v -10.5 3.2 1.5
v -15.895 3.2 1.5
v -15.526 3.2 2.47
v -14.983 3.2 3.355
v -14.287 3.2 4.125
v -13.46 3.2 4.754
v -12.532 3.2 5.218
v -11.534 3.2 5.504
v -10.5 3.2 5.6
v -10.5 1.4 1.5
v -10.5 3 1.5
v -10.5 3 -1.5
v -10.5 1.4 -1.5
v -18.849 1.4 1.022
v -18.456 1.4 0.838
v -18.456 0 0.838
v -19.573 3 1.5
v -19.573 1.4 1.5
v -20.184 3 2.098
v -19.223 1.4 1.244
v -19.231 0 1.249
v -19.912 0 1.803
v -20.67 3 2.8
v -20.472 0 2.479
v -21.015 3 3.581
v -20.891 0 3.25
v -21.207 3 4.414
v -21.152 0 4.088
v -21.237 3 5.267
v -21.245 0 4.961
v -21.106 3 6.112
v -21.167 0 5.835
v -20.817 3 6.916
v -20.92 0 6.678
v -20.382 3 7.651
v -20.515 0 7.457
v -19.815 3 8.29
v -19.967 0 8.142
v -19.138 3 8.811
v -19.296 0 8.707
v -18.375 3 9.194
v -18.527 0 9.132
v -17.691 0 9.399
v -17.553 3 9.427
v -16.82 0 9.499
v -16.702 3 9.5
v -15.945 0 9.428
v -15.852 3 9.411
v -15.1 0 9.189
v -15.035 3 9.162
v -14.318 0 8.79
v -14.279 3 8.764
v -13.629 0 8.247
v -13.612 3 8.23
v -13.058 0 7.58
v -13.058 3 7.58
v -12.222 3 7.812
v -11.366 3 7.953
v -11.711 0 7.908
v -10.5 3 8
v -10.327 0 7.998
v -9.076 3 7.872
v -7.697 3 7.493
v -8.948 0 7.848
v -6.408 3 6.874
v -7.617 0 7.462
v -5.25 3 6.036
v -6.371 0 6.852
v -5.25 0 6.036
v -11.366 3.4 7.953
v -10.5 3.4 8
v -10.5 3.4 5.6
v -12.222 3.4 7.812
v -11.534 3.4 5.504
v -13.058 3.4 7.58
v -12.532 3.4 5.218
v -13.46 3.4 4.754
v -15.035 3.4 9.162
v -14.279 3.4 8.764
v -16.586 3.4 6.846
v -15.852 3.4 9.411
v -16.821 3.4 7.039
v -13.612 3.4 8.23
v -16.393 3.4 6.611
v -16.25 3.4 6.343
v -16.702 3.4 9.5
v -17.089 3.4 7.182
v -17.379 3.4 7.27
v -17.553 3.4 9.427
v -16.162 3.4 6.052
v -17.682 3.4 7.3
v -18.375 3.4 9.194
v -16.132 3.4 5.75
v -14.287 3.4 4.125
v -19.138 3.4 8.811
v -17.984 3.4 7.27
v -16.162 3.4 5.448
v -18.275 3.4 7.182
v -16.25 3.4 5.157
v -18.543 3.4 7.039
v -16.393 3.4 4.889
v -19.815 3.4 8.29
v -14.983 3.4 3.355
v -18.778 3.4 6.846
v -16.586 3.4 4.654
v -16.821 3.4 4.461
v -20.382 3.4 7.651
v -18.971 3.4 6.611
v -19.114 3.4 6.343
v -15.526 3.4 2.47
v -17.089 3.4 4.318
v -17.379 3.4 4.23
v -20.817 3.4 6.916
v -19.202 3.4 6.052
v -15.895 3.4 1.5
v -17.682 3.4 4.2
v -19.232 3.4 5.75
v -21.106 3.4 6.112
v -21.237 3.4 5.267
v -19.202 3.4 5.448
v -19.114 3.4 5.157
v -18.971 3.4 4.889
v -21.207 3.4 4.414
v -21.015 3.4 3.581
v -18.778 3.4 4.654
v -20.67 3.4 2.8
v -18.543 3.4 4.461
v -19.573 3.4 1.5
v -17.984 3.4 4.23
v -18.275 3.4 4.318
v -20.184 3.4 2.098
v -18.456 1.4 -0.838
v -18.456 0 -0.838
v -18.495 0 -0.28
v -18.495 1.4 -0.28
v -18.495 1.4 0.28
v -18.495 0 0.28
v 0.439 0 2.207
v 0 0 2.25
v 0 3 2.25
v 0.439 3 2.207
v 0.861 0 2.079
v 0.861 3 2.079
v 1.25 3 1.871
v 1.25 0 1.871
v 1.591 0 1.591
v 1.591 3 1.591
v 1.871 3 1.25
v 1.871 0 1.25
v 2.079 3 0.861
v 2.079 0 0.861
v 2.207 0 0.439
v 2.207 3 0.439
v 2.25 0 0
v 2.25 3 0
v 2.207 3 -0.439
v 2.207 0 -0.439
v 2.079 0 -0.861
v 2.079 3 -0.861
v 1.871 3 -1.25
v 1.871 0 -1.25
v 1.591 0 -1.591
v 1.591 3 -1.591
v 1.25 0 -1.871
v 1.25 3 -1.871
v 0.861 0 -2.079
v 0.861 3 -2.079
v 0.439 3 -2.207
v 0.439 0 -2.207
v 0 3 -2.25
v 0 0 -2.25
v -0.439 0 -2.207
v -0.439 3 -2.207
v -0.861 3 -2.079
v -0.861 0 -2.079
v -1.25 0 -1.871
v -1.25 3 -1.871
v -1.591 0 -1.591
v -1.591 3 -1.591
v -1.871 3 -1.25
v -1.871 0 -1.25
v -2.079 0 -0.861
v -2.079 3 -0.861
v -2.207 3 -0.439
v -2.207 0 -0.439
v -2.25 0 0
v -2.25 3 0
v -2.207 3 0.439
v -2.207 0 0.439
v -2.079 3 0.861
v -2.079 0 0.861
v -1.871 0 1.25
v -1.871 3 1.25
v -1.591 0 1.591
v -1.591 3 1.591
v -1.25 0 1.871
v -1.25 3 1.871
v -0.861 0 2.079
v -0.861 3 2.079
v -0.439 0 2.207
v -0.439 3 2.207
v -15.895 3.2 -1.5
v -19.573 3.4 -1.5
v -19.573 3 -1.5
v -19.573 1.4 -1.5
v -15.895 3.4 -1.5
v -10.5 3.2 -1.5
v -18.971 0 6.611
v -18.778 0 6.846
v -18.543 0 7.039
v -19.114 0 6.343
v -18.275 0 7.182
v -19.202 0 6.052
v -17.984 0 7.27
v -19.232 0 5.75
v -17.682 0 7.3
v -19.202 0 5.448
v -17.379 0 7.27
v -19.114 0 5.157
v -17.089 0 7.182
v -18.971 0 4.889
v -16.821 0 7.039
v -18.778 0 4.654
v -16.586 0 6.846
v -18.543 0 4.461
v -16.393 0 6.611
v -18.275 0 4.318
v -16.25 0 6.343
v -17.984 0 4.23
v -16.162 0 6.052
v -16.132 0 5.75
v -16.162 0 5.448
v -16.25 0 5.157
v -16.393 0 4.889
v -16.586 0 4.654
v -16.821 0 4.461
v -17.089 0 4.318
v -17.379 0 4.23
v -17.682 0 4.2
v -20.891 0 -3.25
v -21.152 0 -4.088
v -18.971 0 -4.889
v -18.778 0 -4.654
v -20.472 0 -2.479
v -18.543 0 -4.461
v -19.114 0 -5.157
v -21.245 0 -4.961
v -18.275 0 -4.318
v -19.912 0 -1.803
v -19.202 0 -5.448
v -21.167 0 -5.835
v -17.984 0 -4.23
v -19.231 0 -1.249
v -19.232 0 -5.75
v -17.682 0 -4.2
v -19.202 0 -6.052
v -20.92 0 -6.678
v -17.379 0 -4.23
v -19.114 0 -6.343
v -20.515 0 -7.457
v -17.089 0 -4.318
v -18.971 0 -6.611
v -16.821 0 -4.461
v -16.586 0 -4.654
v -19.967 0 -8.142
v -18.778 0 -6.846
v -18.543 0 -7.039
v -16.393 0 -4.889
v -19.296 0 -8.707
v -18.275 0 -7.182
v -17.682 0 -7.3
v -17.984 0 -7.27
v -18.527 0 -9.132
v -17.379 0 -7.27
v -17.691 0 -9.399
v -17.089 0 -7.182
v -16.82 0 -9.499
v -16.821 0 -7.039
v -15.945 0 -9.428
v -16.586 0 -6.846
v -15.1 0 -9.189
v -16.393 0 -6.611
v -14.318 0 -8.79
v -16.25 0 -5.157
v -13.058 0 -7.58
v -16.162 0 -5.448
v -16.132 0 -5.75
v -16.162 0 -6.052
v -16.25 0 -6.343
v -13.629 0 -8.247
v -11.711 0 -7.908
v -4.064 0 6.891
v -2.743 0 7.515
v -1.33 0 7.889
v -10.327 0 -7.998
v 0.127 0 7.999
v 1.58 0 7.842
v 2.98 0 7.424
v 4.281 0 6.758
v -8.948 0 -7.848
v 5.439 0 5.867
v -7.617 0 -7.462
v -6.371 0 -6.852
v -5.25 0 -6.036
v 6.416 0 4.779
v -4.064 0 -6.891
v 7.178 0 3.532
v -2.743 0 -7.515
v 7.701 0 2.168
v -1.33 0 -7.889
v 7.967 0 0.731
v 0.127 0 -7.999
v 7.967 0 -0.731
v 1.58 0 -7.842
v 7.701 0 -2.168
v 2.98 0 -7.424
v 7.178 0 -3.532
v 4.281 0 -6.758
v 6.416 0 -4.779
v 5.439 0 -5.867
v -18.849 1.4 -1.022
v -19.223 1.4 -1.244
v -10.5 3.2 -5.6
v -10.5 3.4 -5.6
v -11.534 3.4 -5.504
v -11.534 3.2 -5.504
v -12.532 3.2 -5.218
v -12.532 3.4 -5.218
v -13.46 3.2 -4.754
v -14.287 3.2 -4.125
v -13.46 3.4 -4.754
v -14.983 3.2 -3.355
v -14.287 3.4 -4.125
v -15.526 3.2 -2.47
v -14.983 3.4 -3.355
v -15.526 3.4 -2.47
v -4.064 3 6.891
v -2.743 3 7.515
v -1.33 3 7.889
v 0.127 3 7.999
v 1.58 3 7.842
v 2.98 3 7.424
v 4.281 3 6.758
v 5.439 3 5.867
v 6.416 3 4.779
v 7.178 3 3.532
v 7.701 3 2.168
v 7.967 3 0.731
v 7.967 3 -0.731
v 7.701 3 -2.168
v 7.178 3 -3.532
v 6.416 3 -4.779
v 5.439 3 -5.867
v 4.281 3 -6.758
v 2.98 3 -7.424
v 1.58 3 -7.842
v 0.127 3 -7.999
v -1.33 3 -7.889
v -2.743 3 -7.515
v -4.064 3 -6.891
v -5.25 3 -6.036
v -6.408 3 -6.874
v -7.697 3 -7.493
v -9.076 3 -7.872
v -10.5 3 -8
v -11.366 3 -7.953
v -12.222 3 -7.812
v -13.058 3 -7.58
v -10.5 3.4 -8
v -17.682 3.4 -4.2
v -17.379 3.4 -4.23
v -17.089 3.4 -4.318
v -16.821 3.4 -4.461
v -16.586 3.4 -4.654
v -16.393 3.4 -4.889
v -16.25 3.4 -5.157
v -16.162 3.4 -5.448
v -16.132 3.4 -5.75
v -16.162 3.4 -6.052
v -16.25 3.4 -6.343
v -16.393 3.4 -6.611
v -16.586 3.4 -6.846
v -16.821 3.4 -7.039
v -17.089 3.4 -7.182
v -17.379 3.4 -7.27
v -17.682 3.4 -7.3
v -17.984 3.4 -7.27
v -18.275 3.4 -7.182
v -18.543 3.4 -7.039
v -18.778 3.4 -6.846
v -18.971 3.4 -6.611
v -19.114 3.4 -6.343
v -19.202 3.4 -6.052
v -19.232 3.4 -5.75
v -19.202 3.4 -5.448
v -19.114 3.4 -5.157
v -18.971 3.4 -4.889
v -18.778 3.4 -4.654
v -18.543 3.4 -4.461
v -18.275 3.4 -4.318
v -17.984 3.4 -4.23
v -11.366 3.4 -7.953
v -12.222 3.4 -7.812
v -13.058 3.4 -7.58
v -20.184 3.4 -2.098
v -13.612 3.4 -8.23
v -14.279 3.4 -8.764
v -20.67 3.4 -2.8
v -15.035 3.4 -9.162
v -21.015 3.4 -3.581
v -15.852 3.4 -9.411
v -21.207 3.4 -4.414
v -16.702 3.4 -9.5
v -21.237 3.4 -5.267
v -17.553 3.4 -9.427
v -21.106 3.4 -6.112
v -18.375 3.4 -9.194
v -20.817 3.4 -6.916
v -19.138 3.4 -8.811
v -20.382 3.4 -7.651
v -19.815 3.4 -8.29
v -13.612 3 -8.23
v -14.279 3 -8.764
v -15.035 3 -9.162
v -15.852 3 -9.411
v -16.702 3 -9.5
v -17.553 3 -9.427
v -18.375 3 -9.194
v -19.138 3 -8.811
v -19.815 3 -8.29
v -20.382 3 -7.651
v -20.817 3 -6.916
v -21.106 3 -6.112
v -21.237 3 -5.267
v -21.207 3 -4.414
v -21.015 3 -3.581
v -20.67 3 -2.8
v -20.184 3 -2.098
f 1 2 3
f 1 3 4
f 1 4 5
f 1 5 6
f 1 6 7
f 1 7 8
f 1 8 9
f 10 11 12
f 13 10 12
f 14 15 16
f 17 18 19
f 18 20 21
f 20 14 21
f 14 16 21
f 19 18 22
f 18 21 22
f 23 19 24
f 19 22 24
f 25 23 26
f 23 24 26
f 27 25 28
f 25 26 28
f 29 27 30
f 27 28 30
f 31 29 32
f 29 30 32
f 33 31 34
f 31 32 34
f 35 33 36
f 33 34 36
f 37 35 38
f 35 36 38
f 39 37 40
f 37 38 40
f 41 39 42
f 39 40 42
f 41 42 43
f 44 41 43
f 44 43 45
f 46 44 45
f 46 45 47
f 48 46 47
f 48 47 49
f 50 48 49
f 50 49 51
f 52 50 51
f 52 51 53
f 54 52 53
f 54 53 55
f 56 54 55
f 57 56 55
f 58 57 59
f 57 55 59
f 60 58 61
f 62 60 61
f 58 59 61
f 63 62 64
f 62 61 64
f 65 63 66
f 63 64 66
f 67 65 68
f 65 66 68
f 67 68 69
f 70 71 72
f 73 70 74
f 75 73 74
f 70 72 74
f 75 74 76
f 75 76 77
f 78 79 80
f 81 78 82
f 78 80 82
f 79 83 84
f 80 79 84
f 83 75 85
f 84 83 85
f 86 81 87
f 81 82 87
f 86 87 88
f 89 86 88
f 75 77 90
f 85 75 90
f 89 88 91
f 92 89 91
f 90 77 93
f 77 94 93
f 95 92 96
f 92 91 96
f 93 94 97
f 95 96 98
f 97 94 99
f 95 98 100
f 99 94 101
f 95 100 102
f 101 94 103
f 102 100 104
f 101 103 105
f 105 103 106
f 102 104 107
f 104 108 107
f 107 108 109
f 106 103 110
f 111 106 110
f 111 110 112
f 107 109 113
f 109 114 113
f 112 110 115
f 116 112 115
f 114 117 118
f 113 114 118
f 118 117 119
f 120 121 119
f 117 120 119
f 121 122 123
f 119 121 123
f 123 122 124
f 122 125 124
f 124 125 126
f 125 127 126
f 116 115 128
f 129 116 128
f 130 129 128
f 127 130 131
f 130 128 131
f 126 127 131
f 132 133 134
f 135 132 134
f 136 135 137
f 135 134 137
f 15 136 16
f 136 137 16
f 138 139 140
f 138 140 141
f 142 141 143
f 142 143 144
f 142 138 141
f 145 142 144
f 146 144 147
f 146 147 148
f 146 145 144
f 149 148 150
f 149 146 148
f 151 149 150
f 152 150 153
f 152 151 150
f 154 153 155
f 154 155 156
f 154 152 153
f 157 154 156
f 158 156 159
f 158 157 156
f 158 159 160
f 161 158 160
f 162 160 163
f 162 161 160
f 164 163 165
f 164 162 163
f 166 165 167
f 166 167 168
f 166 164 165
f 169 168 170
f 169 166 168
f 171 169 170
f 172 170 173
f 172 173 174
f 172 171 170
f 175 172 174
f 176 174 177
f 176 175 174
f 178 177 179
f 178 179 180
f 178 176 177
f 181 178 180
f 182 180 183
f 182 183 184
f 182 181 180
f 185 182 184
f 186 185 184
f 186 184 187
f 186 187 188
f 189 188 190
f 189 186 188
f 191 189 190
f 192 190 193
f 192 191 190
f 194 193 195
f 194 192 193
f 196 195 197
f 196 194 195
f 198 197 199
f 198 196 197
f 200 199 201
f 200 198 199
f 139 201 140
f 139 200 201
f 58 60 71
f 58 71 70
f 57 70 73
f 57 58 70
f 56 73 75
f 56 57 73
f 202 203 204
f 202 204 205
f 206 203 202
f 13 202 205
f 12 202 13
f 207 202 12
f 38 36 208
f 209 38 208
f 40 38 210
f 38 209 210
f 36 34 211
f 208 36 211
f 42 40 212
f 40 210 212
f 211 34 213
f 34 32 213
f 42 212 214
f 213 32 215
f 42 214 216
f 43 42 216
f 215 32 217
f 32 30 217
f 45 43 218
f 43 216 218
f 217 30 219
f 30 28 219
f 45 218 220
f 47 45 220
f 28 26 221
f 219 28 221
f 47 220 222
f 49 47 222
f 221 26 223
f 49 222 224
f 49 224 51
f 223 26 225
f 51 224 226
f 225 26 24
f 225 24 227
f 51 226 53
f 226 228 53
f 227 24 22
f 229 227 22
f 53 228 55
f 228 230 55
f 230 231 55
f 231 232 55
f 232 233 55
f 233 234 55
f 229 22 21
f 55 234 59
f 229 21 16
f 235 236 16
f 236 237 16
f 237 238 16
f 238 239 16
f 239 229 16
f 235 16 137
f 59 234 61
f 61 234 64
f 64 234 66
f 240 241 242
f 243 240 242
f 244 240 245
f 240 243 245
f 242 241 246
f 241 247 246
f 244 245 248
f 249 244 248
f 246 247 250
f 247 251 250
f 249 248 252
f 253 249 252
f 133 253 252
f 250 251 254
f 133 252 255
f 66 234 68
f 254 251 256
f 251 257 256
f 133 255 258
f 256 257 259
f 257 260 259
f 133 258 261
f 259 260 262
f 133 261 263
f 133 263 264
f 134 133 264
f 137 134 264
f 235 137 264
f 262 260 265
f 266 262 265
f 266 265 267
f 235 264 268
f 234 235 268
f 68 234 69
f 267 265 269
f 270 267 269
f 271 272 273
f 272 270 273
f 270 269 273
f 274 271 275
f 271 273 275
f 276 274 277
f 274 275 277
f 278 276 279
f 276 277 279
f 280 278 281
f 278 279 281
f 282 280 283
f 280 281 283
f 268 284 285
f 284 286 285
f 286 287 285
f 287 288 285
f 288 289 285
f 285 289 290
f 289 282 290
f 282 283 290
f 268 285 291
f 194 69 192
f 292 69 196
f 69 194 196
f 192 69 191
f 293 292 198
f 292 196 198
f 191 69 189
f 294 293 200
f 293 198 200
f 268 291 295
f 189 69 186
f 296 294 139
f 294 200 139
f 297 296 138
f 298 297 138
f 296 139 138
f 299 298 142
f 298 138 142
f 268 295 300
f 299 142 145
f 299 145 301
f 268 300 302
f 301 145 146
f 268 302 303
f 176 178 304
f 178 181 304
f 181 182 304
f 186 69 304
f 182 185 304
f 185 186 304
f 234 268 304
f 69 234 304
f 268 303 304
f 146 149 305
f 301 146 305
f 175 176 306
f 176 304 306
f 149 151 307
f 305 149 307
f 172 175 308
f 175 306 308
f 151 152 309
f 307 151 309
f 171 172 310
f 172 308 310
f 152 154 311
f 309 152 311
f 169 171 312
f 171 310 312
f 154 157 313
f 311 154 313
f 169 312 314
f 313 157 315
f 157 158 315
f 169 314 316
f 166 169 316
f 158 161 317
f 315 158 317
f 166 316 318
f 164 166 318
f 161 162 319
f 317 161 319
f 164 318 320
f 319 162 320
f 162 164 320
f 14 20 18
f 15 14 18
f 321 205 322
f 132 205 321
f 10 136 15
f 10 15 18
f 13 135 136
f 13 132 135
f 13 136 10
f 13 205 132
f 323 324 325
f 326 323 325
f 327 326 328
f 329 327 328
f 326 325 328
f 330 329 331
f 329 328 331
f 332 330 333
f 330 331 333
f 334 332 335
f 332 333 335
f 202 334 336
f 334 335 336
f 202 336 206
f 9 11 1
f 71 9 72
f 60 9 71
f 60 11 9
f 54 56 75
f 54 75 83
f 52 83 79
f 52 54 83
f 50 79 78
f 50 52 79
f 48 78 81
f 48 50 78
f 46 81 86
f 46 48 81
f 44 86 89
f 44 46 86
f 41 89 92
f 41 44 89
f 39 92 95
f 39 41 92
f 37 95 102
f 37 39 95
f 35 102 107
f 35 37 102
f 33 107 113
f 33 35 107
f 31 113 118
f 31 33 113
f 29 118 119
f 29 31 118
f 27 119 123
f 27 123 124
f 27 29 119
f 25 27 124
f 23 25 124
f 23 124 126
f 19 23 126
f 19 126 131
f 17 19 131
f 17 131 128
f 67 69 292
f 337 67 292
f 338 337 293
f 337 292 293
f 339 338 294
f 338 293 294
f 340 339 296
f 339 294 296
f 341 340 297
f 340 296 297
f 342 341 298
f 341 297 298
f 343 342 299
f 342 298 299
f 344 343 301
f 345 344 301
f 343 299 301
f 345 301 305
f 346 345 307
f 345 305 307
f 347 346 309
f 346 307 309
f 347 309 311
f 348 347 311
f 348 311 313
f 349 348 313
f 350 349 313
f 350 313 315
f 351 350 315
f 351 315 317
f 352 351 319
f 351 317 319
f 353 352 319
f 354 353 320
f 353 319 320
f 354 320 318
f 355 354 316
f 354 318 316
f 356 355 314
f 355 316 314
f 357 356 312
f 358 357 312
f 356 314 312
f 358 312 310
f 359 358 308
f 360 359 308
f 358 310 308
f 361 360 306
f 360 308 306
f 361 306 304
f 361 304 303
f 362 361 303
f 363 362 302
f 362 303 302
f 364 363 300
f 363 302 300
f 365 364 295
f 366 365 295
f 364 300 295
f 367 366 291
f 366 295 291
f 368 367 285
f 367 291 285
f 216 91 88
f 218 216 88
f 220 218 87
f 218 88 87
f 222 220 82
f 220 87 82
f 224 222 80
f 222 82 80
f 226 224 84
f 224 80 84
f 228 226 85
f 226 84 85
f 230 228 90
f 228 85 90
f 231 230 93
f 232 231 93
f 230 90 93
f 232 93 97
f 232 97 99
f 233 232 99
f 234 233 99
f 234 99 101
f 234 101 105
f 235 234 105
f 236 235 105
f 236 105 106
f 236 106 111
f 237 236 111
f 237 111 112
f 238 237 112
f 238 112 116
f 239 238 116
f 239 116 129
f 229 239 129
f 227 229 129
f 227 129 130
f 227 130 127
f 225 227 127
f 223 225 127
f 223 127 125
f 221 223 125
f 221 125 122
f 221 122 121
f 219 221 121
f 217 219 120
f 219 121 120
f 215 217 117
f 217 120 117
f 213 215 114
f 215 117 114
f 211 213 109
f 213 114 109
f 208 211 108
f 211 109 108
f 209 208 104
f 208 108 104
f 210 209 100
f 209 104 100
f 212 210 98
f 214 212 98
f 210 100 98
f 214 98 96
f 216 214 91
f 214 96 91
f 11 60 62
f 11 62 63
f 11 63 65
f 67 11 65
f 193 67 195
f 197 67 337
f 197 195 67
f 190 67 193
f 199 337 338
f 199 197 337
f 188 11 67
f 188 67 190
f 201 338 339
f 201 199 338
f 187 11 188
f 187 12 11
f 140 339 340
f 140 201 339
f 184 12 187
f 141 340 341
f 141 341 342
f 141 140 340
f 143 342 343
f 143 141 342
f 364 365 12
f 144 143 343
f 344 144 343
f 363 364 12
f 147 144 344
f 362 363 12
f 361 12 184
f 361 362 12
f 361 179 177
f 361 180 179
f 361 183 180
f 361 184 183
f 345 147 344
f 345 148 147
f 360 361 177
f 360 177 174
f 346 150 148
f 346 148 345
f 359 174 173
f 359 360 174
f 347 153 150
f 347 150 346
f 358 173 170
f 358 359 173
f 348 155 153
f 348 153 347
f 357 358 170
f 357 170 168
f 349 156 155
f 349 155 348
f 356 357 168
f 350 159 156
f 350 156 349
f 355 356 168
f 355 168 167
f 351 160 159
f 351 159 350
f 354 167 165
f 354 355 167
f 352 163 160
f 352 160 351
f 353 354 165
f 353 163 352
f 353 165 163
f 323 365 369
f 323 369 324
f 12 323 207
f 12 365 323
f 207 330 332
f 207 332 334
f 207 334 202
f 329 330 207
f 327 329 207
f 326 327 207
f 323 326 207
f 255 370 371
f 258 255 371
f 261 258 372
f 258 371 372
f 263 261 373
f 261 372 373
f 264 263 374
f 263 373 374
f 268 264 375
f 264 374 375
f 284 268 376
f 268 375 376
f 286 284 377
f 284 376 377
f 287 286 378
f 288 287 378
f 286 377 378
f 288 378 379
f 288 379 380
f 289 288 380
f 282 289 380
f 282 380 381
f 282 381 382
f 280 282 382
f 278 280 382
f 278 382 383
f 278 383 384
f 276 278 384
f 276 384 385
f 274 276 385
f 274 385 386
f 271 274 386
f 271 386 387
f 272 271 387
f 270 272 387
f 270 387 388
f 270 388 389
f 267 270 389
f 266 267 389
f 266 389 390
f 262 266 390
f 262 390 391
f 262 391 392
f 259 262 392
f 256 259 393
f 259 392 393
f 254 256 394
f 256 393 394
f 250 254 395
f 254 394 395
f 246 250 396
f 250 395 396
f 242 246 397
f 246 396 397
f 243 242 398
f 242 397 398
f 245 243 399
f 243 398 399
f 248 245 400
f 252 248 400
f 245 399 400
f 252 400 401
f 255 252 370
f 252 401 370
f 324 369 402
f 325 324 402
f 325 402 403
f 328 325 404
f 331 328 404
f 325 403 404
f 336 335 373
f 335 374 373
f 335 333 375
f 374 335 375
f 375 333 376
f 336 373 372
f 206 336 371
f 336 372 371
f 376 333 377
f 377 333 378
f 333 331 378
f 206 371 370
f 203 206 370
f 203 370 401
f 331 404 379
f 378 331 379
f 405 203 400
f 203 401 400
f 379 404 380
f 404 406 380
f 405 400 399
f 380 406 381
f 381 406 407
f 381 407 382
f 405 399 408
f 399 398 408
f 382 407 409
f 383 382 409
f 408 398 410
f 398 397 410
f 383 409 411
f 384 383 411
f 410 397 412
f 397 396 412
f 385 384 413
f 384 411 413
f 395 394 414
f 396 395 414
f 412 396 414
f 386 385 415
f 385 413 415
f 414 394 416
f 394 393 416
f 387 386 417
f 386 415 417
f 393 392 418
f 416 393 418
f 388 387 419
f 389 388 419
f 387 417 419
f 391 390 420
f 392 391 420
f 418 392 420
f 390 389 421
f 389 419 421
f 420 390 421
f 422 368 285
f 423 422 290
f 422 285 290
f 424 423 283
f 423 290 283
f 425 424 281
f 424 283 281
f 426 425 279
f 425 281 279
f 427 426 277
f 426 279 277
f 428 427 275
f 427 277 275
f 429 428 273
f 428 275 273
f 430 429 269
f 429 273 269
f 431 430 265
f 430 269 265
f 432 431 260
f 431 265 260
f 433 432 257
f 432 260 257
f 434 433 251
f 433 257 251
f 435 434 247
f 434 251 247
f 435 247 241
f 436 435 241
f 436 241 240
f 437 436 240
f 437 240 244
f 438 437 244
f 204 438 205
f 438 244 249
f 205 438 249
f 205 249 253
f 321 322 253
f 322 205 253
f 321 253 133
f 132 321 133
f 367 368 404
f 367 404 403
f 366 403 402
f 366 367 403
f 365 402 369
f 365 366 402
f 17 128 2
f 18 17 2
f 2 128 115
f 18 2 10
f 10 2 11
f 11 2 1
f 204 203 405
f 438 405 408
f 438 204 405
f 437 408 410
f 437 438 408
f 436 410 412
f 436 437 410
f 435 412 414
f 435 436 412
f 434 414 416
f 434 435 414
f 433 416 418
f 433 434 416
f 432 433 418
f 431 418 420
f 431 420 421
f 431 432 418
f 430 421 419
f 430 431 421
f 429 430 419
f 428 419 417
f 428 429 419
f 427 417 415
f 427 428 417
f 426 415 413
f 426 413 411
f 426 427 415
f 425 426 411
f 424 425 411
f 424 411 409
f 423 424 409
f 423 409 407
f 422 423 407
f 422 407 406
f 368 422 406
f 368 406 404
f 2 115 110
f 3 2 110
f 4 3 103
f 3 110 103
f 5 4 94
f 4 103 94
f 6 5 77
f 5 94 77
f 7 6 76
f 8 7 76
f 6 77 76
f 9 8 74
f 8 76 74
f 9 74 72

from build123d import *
from build123d.topology import SkipClean

# Parameters (mm, degrees)
SKETCH_1_R          = 2.25
EXTRUDE_1_DEPTH     = 3
EXTRUDE_2_DEPTH     = 0.4
SKETCH_6_W          = 12.522512513
SKETCH_6_H          = 3
CUT_EXTRUDE_1_DEPTH = 2
SKETCH_7_R          = 5.6
CUT_EXTRUDE_2_DEPTH = 0.2
SKETCH_9_R          = 1.55
CUT_EXTRUDE_3_DEPTH = 24.519352456


with BuildPart() as part:
    # 草图1 → 凸台-拉伸1 (new body)
    with BuildSketch(Plane(origin=(0, 0, 0), x_dir=(1, 0, 0), z_dir=(0, 1, 0))):
        with BuildLine():
            ThreePointArc((-5.25, -6.036348234), (8, 0), (-5.25, 6.036348234))
            ThreePointArc((-5.25, 6.036348234), (-8.948430916, 7.848097437), (-13.058047675, 7.579999479))
            ThreePointArc((-13.058047675, 7.579999479), (-20.257809372, 7.8125), (-18.455991924, 0.837969271))
            ThreePointArc((-18.455991924, 0.837969271), (-18.5, 0), (-18.455991924, -0.837969271))
            ThreePointArc((-18.455991924, -0.837969271), (-20.257809372, -7.8125), (-13.058047675, -7.579999479))
            ThreePointArc((-13.058047675, -7.579999479), (-8.948430916, -7.848097437), (-5.25, -6.036348234))
        make_face()
        with Locations(Location((0, 0, 0), (0, 0, 270))):
            Circle(SKETCH_1_R, mode=Mode.SUBTRACT)
    extrude(amount=EXTRUDE_1_DEPTH)

    # 草图5 → 凸台-拉伸2 (add)
    with SkipClean():  # the faces are left unmerged after this step: merging them gives an invalid solid
        with BuildSketch(Plane(origin=(0, 3, 0), x_dir=(1, 0, 0), z_dir=(0, 1, 0))):
            with BuildLine():
                Line((-10.5, 8), (-10.5, -8))
                ThreePointArc((-10.5, -8), (-11.796148944, -7.89430161), (-13.058047675, -7.579999479))
                ThreePointArc((-13.058047675, -7.579999479), (-20.257809372, -7.8125), (-18.455991924, -0.837969271))
                ThreePointArc((-18.455991924, -0.837969271), (-18.5, 0), (-18.455991924, 0.837969271))
                ThreePointArc((-18.455991924, 0.837969271), (-20.257809372, 7.8125), (-13.058047675, 7.579999479))
                ThreePointArc((-13.058047675, 7.579999479), (-11.796148944, 7.89430161), (-10.5, 8))
            make_face()
        extrude(amount=EXTRUDE_2_DEPTH)

    # 草图6 → 切除-拉伸1 (cut)
    with SkipClean():  # the faces are left unmerged after this step: merging them gives an invalid solid
        with BuildSketch(Plane(origin=(0, 3.4, 0), x_dir=(1, 0, 0), z_dir=(0, 1, 0))):
            with Locations((-16.761256257, 0)):
                Rectangle(SKETCH_6_W, SKETCH_6_H)
        extrude(amount=-CUT_EXTRUDE_1_DEPTH, mode=Mode.SUBTRACT)

    # 草图7 → 切除-拉伸2 (cut)
    with SkipClean():  # the faces are left unmerged after this step: merging them gives an invalid solid
        with BuildSketch(Plane(origin=(0, 3.4, 0), x_dir=(1, 0, 0), z_dir=(0, 1, 0))):
            with Locations((-10.5, 0)):
                Circle(SKETCH_7_R)
        extrude(amount=-CUT_EXTRUDE_2_DEPTH, mode=Mode.SUBTRACT)

    # 草图9 → 切除-拉伸3 (cut, through all)
    with SkipClean():  # the faces are left unmerged after this step: merging them gives an invalid solid
        with BuildSketch(Plane(origin=(0, 3.4, 0), x_dir=(1, 0, 0), z_dir=(0, 1, 0))):
            with Locations(Location((-17.681747698, 5.75, 0), (0, 0, 270))):
                Circle(SKETCH_9_R)
            with Locations(Location((-17.681747698, -5.75, 0), (0, 0, 270))):
                Circle(SKETCH_9_R)
        extrude(amount=-CUT_EXTRUDE_3_DEPTH, mode=Mode.SUBTRACT)


solid = part.part
